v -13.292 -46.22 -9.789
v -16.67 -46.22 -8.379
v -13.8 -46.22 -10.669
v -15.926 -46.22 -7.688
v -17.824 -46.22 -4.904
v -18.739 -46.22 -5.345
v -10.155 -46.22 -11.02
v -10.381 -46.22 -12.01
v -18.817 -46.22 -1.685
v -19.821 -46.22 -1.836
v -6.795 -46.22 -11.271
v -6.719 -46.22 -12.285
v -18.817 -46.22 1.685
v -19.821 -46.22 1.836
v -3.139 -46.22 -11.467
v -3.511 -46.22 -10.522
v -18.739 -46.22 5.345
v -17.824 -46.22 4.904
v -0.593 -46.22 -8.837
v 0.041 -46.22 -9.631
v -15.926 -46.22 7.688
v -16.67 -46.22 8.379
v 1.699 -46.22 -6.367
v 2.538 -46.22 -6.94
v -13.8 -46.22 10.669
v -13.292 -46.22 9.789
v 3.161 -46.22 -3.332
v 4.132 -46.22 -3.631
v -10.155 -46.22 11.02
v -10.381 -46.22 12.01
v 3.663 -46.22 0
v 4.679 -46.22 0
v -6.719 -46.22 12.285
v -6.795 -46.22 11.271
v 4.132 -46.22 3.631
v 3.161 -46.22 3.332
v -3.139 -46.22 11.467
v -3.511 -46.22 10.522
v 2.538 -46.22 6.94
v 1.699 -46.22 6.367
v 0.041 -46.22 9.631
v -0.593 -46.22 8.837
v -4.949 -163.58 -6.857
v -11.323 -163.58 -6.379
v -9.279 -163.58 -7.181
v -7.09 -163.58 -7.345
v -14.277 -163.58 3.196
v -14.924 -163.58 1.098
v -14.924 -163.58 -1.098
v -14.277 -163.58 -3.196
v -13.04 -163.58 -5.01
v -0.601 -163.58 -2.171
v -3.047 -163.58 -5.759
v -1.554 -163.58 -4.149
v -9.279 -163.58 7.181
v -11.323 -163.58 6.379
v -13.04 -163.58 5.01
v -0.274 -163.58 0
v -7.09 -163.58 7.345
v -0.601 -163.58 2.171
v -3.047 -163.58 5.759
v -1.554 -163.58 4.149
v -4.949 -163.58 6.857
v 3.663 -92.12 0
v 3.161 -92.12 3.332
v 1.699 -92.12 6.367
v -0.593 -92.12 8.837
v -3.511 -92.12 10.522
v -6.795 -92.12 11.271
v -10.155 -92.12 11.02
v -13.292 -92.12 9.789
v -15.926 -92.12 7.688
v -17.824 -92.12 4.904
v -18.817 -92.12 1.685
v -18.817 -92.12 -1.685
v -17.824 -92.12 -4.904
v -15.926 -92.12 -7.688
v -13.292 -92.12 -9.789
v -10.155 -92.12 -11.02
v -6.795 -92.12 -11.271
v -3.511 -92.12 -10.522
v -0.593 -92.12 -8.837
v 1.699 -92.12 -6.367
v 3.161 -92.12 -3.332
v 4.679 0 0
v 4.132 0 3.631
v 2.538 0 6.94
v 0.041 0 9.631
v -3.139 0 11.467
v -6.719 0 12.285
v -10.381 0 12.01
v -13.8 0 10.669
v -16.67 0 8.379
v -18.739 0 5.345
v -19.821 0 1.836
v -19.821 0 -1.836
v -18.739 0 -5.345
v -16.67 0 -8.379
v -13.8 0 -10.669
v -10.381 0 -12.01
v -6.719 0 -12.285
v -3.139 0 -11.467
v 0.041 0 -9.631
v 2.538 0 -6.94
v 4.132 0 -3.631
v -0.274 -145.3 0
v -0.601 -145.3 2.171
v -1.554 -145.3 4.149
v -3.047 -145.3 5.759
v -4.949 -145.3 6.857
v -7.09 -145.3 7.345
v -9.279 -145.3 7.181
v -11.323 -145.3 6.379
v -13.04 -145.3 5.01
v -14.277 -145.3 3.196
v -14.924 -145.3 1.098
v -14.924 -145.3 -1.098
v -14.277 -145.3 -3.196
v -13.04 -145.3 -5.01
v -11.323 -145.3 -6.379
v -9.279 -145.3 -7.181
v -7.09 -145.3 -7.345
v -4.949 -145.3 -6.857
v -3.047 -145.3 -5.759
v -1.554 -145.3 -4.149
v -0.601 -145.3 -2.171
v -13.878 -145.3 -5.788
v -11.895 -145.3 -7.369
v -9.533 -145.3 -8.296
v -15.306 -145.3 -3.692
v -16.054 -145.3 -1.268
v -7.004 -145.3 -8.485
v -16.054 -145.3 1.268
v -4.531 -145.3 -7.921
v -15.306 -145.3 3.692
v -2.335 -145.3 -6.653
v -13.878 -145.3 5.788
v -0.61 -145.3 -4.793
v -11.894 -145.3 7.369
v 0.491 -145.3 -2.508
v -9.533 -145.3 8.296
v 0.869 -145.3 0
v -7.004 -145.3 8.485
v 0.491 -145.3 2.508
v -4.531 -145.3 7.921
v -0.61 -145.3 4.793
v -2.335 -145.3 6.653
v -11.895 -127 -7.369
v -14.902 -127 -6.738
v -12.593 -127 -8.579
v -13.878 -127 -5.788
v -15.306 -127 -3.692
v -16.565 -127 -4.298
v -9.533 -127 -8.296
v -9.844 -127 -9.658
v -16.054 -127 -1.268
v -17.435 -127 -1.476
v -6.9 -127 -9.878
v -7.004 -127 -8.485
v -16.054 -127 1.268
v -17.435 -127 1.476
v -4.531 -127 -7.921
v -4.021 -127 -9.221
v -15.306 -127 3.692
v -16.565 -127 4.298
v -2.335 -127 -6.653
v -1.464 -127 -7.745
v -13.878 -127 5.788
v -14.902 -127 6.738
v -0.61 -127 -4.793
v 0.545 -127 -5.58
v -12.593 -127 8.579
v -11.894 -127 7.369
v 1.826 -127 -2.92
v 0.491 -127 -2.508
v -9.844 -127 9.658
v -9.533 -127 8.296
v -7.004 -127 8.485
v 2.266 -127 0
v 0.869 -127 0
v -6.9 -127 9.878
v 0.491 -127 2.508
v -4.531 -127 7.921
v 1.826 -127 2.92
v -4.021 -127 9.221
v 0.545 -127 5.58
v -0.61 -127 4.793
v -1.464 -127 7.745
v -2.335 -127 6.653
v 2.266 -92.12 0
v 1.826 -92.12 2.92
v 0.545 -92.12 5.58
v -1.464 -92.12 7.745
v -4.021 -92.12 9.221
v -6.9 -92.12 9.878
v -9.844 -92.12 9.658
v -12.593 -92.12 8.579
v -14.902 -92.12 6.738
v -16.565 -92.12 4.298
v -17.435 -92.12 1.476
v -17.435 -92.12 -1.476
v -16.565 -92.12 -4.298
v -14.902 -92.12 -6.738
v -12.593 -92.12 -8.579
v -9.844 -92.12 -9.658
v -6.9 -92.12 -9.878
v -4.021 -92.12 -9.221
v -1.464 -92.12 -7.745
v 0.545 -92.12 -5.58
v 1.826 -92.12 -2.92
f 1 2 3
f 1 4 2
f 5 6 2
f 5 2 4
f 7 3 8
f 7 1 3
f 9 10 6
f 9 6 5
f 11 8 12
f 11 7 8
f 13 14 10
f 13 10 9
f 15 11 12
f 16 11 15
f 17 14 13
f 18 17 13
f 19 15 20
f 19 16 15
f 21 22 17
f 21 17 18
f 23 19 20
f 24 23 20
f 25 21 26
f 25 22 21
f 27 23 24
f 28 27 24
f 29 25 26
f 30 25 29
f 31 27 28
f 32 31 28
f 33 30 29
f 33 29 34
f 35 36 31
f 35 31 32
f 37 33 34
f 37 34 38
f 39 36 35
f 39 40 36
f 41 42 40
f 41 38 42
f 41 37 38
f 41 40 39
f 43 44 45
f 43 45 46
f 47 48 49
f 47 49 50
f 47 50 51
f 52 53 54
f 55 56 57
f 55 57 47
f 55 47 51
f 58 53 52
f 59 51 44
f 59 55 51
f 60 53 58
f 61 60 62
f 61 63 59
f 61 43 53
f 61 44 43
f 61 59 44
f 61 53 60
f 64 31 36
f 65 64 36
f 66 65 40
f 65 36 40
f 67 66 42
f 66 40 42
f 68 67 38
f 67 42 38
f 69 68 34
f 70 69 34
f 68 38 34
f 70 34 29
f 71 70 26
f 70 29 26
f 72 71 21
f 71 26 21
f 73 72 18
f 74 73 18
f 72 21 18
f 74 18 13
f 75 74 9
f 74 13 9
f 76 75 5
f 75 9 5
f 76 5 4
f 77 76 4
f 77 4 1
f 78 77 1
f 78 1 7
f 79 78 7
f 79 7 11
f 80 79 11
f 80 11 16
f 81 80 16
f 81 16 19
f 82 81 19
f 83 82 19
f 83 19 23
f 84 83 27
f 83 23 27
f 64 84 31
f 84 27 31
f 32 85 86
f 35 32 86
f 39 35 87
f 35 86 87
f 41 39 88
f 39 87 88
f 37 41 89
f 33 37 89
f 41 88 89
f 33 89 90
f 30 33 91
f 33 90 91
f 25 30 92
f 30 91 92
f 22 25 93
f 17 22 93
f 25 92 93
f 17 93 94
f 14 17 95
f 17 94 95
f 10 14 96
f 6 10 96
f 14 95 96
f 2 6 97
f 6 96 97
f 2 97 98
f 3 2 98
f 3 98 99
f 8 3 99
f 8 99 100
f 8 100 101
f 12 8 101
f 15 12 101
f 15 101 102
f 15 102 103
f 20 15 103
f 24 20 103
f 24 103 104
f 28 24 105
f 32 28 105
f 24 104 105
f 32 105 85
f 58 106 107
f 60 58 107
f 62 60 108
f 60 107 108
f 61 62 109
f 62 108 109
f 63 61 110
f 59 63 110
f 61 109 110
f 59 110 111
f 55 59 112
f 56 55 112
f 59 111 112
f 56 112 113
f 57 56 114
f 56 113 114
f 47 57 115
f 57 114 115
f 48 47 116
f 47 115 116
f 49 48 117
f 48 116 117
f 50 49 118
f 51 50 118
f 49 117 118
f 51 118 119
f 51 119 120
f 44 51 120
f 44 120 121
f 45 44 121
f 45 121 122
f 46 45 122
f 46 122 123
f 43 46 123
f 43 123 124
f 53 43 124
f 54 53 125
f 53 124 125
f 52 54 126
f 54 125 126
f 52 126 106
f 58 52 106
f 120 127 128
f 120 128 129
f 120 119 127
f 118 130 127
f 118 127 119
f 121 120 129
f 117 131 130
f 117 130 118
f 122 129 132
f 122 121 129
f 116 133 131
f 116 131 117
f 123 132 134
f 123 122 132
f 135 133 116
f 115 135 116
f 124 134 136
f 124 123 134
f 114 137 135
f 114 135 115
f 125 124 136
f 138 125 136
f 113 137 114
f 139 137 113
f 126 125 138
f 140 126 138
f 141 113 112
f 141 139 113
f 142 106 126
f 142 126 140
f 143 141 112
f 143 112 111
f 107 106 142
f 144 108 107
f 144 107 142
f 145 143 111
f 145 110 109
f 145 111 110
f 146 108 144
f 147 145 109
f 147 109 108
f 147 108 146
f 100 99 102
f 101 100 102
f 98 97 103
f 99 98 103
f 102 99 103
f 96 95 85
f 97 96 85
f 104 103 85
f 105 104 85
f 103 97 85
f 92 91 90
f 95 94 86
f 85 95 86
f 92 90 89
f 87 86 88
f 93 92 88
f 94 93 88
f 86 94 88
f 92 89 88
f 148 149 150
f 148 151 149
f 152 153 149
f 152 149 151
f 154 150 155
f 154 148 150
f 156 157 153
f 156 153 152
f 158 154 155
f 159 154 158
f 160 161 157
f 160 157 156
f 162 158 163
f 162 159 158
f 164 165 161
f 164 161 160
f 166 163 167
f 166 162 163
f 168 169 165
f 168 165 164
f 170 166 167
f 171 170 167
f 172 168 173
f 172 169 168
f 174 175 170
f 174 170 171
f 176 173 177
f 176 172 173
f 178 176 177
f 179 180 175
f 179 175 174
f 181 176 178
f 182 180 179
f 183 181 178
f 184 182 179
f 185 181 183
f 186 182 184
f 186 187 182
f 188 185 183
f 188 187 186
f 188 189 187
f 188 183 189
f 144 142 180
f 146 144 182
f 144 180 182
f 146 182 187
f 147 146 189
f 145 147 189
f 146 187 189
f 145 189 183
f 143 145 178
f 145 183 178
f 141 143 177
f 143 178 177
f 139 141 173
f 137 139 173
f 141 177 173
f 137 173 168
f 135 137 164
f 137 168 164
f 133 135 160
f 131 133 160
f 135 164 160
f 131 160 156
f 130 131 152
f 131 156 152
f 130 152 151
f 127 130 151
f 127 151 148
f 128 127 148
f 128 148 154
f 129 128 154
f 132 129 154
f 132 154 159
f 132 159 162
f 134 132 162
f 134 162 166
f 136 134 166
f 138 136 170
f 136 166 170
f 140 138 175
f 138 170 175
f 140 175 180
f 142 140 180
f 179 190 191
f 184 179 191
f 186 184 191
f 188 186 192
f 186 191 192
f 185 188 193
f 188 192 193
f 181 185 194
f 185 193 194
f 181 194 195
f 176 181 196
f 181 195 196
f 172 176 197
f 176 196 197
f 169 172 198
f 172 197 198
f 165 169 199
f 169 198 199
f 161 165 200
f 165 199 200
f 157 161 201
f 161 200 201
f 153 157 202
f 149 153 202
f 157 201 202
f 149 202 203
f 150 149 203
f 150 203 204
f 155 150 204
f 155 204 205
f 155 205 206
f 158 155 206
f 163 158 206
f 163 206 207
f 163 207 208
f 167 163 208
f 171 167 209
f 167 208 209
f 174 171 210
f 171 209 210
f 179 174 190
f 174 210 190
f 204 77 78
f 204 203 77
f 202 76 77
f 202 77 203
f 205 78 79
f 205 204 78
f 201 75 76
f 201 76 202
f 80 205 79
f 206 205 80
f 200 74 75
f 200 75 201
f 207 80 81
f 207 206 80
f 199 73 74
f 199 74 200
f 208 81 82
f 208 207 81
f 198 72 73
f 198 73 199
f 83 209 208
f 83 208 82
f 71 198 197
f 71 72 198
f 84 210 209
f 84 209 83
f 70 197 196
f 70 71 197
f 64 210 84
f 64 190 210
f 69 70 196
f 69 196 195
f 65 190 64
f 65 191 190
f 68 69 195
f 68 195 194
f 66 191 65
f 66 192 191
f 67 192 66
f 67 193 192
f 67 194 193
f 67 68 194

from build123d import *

# Parameters (mm, degrees)
F0_R     = 12.319
F1_DEPTH = 46.219999
F2_R     = 11.303
F3_DEPTH = 45.90001
F4_R     = 9.906
F5_DEPTH = 34.879999
F6_R     = 8.509
F7_DEPTH = 18.299999
F8_R     = 7.366
F9_DEPTH = 18.28


with BuildPart() as f1:
    # F0 (on Front) → F1 (new body)
    with BuildSketch(Plane.XZ):
        with Locations((-7.64, 0)):
            Circle(F0_R)
    extrude(amount=F1_DEPTH)

    # F2 (on face) → F3 (join)
    with BuildSketch(Plane.XZ.offset(46.219999)):
        with Locations((-7.64, 0)):
            Circle(F2_R)
    extrude(amount=F3_DEPTH)

    # F4 (on face) → F5 (join)
    with BuildSketch(Plane.XZ.offset(92.120009)):
        with Locations((-7.64, 0)):
            Circle(F4_R)
    extrude(amount=F5_DEPTH)

    # F6 (on face) → F7 (join)
    with BuildSketch(Plane.XZ.offset(127.000008)):
        with Locations((-7.64, 0)):
            Circle(F6_R)
    extrude(amount=F7_DEPTH)

    # F8 (on face) → F9 (join)
    with BuildSketch(Plane.XZ.offset(145.300007)):
        with Locations((-7.64, 0)):
            Circle(F8_R)
    extrude(amount=F9_DEPTH)


solid = f1.part
